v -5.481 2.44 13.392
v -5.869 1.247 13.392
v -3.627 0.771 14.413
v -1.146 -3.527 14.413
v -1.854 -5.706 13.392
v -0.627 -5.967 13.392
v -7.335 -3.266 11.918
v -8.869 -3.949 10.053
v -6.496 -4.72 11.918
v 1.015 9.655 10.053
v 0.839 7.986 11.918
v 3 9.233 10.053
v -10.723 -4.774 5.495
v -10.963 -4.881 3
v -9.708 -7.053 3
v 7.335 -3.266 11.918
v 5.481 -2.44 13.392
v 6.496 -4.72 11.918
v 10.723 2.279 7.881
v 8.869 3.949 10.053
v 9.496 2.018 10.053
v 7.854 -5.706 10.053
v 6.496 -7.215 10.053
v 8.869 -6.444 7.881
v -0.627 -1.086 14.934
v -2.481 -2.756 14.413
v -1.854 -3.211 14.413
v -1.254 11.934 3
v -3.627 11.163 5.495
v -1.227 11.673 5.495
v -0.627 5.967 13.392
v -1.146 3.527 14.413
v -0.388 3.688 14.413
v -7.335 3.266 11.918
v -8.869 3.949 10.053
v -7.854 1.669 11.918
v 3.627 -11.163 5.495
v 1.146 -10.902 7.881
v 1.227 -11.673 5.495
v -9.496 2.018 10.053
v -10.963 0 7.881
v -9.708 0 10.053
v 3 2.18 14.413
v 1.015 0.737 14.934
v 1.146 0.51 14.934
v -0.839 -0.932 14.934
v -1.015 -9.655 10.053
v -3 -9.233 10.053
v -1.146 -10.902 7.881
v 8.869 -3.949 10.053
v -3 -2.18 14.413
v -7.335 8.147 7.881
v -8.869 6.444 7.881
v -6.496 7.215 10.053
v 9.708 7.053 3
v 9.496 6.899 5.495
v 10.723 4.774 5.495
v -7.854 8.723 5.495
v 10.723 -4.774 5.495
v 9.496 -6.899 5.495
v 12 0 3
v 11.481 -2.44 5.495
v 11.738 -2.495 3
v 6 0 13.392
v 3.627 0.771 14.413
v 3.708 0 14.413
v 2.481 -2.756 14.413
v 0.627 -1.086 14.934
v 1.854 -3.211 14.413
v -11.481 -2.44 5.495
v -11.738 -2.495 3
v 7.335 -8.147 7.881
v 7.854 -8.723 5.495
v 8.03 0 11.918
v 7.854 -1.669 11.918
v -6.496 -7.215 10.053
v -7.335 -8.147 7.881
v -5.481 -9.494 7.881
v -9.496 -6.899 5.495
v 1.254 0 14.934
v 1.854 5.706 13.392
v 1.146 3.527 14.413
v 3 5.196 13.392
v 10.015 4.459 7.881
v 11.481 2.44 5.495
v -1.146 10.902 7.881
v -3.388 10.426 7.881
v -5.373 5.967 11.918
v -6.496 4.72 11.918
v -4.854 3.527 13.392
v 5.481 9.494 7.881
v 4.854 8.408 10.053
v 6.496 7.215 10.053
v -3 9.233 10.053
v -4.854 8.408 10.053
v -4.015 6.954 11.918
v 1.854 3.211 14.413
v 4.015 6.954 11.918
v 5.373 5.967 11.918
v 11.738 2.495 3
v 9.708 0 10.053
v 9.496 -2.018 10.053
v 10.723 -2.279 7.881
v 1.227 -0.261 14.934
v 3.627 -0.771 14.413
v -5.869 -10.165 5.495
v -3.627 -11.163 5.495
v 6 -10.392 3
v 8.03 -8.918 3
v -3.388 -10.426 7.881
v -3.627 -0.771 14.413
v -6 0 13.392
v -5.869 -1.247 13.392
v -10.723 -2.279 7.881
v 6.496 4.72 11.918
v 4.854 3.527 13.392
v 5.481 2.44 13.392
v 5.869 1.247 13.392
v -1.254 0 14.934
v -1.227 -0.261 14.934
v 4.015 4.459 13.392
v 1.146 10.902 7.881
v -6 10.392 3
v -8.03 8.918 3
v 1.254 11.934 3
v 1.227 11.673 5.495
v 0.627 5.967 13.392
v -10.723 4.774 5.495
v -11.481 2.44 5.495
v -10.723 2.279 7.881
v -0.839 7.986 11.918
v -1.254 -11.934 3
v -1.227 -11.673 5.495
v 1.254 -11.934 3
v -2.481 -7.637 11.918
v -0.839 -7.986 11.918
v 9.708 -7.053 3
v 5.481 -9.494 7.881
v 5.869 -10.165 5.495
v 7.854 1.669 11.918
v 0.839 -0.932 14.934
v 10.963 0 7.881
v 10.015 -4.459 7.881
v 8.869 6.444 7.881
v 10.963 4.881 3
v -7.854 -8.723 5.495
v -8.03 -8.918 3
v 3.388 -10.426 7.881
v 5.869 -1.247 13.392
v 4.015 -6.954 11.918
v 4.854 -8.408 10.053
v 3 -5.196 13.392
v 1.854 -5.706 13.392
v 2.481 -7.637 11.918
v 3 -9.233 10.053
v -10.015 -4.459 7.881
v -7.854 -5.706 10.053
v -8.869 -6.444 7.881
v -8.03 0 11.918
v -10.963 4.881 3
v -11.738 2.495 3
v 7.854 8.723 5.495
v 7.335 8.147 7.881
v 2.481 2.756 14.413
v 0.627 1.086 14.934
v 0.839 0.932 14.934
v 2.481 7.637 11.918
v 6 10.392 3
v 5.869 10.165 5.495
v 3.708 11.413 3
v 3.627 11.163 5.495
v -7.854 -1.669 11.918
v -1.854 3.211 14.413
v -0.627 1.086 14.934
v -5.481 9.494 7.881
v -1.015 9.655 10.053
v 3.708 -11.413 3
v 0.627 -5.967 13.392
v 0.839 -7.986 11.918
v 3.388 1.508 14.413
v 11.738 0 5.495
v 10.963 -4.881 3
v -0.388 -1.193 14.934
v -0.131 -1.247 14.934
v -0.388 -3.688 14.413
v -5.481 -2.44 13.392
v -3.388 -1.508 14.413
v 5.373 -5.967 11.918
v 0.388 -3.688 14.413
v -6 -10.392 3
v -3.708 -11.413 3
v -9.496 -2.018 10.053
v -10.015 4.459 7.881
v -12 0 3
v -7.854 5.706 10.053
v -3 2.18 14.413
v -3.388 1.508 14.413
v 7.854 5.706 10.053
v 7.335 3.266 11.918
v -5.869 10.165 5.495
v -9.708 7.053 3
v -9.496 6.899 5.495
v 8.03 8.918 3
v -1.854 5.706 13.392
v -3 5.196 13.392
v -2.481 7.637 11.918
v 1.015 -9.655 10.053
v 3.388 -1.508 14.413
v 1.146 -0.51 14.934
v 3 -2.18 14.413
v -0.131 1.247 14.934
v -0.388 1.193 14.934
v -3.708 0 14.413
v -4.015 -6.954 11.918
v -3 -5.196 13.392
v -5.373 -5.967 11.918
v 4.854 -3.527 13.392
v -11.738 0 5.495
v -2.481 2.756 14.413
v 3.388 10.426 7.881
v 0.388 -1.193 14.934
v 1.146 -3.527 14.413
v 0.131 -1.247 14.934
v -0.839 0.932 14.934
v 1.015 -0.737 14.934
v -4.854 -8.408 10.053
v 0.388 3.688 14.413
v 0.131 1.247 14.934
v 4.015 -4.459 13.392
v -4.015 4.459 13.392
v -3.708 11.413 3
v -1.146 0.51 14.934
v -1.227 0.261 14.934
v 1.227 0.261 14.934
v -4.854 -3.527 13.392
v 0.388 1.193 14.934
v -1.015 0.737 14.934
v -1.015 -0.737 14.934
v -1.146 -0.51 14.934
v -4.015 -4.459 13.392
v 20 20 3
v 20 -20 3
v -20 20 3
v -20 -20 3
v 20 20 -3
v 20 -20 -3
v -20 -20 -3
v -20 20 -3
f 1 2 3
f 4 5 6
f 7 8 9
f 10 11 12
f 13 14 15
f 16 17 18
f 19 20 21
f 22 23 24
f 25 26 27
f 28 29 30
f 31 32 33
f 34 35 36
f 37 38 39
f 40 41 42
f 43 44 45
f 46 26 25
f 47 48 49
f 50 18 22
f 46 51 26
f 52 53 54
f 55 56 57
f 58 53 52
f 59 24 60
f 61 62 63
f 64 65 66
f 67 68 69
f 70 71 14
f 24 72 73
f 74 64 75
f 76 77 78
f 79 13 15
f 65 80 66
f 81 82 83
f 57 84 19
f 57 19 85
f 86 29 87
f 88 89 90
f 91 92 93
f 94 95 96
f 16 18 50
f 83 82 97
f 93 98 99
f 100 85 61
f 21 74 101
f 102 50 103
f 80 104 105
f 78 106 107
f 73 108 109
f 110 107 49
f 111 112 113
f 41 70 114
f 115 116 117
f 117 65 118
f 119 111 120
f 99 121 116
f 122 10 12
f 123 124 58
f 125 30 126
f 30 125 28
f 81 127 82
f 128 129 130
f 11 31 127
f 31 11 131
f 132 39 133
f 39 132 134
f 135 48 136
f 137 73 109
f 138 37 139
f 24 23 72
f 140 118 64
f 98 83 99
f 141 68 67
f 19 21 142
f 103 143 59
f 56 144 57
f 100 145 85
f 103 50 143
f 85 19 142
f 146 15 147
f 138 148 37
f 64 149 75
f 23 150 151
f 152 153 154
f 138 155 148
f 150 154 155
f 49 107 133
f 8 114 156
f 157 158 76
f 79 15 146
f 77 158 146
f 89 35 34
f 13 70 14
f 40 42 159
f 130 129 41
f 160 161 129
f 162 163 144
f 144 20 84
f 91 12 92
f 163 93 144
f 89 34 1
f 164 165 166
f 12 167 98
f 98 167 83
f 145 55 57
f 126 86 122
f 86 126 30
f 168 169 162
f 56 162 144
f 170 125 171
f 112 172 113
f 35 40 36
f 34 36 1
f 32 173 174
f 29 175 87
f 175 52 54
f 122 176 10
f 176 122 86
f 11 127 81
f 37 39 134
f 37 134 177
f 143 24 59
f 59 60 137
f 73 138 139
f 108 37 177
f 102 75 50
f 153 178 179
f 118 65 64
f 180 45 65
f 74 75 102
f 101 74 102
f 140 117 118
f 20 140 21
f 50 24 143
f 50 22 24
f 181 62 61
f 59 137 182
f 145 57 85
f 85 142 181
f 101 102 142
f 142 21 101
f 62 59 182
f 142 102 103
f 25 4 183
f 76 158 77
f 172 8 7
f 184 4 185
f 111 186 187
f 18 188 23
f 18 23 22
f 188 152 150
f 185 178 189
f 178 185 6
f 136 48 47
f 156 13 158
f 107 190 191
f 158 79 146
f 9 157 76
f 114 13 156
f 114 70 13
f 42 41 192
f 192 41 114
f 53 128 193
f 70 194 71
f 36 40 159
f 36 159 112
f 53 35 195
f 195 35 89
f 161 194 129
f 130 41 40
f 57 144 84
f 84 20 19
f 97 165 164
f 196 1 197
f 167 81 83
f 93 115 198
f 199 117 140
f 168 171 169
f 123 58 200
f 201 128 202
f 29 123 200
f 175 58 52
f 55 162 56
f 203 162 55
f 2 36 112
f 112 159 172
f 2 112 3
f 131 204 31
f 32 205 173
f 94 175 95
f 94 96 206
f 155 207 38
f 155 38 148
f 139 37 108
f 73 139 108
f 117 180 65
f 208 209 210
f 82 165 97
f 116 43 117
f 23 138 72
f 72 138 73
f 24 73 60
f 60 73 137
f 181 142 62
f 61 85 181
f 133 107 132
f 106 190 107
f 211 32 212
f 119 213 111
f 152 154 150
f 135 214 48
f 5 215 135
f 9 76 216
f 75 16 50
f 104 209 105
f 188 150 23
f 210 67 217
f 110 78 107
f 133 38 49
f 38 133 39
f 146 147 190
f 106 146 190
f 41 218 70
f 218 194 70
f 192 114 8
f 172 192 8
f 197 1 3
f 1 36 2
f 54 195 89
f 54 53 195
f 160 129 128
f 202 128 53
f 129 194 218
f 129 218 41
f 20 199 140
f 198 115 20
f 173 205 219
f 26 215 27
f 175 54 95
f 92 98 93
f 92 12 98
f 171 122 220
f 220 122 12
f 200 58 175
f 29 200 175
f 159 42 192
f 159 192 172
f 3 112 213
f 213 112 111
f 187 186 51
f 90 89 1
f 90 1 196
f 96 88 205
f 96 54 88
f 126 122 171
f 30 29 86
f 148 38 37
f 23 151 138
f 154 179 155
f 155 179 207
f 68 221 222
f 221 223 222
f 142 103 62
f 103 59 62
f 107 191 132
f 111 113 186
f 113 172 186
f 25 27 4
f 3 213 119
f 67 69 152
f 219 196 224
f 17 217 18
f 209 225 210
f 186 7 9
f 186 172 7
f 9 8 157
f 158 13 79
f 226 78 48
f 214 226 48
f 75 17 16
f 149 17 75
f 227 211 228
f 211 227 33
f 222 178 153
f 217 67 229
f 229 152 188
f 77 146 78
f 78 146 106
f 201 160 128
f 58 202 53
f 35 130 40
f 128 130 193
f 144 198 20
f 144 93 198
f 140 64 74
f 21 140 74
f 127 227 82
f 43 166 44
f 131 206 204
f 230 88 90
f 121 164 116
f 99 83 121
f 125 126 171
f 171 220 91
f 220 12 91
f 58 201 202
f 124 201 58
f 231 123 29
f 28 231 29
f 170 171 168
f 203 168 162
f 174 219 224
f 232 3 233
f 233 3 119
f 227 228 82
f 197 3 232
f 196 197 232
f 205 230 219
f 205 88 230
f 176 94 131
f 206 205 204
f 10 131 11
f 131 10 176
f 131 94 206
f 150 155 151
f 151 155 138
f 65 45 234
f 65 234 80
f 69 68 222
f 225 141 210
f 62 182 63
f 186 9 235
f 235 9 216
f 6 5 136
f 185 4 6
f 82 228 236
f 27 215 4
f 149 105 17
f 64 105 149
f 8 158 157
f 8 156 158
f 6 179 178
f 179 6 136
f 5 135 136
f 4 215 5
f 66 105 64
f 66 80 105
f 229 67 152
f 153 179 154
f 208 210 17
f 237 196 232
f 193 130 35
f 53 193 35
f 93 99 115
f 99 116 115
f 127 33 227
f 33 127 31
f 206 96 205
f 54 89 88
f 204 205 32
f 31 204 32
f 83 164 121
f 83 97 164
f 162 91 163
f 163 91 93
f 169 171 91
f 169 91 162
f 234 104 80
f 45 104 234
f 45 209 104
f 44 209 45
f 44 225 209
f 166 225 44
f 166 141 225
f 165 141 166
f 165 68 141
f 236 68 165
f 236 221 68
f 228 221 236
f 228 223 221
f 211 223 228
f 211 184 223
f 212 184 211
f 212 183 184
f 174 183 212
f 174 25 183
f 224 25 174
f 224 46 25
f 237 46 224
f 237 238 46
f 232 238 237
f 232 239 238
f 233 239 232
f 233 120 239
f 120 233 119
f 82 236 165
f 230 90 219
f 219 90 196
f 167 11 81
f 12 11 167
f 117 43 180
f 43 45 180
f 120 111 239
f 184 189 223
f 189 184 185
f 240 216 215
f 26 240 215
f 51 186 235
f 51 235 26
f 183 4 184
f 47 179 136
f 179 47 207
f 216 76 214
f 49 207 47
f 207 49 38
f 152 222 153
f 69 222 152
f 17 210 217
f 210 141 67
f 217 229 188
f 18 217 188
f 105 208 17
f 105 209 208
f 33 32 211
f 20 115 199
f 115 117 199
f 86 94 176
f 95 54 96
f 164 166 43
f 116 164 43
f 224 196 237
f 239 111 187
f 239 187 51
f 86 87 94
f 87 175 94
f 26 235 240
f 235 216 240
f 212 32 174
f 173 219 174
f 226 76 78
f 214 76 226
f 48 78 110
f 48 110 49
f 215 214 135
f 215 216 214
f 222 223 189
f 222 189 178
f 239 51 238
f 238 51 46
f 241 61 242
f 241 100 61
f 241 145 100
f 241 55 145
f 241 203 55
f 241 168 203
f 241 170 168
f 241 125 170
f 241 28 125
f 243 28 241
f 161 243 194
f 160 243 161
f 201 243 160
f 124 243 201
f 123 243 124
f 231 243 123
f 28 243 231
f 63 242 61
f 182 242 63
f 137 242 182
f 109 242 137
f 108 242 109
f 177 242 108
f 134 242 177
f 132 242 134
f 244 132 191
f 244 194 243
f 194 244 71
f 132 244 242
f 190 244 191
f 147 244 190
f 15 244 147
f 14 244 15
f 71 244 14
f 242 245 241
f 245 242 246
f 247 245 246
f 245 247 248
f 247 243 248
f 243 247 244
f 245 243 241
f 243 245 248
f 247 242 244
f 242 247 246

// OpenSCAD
// A hemisphere seated on a plate: a curved wall meeting a flat one all the way
// round, with no straight arrival anywhere on the crease.
FNSET = 0; $fn = FNSET;
R = 1.5;
union() {
    cube([40, 40, 6], center = true);
    translate([0, 0, 3]) difference() {
        sphere(d = 24);
        translate([0, 0, -14]) cube([28, 28, 28], center = true);
    }
}
